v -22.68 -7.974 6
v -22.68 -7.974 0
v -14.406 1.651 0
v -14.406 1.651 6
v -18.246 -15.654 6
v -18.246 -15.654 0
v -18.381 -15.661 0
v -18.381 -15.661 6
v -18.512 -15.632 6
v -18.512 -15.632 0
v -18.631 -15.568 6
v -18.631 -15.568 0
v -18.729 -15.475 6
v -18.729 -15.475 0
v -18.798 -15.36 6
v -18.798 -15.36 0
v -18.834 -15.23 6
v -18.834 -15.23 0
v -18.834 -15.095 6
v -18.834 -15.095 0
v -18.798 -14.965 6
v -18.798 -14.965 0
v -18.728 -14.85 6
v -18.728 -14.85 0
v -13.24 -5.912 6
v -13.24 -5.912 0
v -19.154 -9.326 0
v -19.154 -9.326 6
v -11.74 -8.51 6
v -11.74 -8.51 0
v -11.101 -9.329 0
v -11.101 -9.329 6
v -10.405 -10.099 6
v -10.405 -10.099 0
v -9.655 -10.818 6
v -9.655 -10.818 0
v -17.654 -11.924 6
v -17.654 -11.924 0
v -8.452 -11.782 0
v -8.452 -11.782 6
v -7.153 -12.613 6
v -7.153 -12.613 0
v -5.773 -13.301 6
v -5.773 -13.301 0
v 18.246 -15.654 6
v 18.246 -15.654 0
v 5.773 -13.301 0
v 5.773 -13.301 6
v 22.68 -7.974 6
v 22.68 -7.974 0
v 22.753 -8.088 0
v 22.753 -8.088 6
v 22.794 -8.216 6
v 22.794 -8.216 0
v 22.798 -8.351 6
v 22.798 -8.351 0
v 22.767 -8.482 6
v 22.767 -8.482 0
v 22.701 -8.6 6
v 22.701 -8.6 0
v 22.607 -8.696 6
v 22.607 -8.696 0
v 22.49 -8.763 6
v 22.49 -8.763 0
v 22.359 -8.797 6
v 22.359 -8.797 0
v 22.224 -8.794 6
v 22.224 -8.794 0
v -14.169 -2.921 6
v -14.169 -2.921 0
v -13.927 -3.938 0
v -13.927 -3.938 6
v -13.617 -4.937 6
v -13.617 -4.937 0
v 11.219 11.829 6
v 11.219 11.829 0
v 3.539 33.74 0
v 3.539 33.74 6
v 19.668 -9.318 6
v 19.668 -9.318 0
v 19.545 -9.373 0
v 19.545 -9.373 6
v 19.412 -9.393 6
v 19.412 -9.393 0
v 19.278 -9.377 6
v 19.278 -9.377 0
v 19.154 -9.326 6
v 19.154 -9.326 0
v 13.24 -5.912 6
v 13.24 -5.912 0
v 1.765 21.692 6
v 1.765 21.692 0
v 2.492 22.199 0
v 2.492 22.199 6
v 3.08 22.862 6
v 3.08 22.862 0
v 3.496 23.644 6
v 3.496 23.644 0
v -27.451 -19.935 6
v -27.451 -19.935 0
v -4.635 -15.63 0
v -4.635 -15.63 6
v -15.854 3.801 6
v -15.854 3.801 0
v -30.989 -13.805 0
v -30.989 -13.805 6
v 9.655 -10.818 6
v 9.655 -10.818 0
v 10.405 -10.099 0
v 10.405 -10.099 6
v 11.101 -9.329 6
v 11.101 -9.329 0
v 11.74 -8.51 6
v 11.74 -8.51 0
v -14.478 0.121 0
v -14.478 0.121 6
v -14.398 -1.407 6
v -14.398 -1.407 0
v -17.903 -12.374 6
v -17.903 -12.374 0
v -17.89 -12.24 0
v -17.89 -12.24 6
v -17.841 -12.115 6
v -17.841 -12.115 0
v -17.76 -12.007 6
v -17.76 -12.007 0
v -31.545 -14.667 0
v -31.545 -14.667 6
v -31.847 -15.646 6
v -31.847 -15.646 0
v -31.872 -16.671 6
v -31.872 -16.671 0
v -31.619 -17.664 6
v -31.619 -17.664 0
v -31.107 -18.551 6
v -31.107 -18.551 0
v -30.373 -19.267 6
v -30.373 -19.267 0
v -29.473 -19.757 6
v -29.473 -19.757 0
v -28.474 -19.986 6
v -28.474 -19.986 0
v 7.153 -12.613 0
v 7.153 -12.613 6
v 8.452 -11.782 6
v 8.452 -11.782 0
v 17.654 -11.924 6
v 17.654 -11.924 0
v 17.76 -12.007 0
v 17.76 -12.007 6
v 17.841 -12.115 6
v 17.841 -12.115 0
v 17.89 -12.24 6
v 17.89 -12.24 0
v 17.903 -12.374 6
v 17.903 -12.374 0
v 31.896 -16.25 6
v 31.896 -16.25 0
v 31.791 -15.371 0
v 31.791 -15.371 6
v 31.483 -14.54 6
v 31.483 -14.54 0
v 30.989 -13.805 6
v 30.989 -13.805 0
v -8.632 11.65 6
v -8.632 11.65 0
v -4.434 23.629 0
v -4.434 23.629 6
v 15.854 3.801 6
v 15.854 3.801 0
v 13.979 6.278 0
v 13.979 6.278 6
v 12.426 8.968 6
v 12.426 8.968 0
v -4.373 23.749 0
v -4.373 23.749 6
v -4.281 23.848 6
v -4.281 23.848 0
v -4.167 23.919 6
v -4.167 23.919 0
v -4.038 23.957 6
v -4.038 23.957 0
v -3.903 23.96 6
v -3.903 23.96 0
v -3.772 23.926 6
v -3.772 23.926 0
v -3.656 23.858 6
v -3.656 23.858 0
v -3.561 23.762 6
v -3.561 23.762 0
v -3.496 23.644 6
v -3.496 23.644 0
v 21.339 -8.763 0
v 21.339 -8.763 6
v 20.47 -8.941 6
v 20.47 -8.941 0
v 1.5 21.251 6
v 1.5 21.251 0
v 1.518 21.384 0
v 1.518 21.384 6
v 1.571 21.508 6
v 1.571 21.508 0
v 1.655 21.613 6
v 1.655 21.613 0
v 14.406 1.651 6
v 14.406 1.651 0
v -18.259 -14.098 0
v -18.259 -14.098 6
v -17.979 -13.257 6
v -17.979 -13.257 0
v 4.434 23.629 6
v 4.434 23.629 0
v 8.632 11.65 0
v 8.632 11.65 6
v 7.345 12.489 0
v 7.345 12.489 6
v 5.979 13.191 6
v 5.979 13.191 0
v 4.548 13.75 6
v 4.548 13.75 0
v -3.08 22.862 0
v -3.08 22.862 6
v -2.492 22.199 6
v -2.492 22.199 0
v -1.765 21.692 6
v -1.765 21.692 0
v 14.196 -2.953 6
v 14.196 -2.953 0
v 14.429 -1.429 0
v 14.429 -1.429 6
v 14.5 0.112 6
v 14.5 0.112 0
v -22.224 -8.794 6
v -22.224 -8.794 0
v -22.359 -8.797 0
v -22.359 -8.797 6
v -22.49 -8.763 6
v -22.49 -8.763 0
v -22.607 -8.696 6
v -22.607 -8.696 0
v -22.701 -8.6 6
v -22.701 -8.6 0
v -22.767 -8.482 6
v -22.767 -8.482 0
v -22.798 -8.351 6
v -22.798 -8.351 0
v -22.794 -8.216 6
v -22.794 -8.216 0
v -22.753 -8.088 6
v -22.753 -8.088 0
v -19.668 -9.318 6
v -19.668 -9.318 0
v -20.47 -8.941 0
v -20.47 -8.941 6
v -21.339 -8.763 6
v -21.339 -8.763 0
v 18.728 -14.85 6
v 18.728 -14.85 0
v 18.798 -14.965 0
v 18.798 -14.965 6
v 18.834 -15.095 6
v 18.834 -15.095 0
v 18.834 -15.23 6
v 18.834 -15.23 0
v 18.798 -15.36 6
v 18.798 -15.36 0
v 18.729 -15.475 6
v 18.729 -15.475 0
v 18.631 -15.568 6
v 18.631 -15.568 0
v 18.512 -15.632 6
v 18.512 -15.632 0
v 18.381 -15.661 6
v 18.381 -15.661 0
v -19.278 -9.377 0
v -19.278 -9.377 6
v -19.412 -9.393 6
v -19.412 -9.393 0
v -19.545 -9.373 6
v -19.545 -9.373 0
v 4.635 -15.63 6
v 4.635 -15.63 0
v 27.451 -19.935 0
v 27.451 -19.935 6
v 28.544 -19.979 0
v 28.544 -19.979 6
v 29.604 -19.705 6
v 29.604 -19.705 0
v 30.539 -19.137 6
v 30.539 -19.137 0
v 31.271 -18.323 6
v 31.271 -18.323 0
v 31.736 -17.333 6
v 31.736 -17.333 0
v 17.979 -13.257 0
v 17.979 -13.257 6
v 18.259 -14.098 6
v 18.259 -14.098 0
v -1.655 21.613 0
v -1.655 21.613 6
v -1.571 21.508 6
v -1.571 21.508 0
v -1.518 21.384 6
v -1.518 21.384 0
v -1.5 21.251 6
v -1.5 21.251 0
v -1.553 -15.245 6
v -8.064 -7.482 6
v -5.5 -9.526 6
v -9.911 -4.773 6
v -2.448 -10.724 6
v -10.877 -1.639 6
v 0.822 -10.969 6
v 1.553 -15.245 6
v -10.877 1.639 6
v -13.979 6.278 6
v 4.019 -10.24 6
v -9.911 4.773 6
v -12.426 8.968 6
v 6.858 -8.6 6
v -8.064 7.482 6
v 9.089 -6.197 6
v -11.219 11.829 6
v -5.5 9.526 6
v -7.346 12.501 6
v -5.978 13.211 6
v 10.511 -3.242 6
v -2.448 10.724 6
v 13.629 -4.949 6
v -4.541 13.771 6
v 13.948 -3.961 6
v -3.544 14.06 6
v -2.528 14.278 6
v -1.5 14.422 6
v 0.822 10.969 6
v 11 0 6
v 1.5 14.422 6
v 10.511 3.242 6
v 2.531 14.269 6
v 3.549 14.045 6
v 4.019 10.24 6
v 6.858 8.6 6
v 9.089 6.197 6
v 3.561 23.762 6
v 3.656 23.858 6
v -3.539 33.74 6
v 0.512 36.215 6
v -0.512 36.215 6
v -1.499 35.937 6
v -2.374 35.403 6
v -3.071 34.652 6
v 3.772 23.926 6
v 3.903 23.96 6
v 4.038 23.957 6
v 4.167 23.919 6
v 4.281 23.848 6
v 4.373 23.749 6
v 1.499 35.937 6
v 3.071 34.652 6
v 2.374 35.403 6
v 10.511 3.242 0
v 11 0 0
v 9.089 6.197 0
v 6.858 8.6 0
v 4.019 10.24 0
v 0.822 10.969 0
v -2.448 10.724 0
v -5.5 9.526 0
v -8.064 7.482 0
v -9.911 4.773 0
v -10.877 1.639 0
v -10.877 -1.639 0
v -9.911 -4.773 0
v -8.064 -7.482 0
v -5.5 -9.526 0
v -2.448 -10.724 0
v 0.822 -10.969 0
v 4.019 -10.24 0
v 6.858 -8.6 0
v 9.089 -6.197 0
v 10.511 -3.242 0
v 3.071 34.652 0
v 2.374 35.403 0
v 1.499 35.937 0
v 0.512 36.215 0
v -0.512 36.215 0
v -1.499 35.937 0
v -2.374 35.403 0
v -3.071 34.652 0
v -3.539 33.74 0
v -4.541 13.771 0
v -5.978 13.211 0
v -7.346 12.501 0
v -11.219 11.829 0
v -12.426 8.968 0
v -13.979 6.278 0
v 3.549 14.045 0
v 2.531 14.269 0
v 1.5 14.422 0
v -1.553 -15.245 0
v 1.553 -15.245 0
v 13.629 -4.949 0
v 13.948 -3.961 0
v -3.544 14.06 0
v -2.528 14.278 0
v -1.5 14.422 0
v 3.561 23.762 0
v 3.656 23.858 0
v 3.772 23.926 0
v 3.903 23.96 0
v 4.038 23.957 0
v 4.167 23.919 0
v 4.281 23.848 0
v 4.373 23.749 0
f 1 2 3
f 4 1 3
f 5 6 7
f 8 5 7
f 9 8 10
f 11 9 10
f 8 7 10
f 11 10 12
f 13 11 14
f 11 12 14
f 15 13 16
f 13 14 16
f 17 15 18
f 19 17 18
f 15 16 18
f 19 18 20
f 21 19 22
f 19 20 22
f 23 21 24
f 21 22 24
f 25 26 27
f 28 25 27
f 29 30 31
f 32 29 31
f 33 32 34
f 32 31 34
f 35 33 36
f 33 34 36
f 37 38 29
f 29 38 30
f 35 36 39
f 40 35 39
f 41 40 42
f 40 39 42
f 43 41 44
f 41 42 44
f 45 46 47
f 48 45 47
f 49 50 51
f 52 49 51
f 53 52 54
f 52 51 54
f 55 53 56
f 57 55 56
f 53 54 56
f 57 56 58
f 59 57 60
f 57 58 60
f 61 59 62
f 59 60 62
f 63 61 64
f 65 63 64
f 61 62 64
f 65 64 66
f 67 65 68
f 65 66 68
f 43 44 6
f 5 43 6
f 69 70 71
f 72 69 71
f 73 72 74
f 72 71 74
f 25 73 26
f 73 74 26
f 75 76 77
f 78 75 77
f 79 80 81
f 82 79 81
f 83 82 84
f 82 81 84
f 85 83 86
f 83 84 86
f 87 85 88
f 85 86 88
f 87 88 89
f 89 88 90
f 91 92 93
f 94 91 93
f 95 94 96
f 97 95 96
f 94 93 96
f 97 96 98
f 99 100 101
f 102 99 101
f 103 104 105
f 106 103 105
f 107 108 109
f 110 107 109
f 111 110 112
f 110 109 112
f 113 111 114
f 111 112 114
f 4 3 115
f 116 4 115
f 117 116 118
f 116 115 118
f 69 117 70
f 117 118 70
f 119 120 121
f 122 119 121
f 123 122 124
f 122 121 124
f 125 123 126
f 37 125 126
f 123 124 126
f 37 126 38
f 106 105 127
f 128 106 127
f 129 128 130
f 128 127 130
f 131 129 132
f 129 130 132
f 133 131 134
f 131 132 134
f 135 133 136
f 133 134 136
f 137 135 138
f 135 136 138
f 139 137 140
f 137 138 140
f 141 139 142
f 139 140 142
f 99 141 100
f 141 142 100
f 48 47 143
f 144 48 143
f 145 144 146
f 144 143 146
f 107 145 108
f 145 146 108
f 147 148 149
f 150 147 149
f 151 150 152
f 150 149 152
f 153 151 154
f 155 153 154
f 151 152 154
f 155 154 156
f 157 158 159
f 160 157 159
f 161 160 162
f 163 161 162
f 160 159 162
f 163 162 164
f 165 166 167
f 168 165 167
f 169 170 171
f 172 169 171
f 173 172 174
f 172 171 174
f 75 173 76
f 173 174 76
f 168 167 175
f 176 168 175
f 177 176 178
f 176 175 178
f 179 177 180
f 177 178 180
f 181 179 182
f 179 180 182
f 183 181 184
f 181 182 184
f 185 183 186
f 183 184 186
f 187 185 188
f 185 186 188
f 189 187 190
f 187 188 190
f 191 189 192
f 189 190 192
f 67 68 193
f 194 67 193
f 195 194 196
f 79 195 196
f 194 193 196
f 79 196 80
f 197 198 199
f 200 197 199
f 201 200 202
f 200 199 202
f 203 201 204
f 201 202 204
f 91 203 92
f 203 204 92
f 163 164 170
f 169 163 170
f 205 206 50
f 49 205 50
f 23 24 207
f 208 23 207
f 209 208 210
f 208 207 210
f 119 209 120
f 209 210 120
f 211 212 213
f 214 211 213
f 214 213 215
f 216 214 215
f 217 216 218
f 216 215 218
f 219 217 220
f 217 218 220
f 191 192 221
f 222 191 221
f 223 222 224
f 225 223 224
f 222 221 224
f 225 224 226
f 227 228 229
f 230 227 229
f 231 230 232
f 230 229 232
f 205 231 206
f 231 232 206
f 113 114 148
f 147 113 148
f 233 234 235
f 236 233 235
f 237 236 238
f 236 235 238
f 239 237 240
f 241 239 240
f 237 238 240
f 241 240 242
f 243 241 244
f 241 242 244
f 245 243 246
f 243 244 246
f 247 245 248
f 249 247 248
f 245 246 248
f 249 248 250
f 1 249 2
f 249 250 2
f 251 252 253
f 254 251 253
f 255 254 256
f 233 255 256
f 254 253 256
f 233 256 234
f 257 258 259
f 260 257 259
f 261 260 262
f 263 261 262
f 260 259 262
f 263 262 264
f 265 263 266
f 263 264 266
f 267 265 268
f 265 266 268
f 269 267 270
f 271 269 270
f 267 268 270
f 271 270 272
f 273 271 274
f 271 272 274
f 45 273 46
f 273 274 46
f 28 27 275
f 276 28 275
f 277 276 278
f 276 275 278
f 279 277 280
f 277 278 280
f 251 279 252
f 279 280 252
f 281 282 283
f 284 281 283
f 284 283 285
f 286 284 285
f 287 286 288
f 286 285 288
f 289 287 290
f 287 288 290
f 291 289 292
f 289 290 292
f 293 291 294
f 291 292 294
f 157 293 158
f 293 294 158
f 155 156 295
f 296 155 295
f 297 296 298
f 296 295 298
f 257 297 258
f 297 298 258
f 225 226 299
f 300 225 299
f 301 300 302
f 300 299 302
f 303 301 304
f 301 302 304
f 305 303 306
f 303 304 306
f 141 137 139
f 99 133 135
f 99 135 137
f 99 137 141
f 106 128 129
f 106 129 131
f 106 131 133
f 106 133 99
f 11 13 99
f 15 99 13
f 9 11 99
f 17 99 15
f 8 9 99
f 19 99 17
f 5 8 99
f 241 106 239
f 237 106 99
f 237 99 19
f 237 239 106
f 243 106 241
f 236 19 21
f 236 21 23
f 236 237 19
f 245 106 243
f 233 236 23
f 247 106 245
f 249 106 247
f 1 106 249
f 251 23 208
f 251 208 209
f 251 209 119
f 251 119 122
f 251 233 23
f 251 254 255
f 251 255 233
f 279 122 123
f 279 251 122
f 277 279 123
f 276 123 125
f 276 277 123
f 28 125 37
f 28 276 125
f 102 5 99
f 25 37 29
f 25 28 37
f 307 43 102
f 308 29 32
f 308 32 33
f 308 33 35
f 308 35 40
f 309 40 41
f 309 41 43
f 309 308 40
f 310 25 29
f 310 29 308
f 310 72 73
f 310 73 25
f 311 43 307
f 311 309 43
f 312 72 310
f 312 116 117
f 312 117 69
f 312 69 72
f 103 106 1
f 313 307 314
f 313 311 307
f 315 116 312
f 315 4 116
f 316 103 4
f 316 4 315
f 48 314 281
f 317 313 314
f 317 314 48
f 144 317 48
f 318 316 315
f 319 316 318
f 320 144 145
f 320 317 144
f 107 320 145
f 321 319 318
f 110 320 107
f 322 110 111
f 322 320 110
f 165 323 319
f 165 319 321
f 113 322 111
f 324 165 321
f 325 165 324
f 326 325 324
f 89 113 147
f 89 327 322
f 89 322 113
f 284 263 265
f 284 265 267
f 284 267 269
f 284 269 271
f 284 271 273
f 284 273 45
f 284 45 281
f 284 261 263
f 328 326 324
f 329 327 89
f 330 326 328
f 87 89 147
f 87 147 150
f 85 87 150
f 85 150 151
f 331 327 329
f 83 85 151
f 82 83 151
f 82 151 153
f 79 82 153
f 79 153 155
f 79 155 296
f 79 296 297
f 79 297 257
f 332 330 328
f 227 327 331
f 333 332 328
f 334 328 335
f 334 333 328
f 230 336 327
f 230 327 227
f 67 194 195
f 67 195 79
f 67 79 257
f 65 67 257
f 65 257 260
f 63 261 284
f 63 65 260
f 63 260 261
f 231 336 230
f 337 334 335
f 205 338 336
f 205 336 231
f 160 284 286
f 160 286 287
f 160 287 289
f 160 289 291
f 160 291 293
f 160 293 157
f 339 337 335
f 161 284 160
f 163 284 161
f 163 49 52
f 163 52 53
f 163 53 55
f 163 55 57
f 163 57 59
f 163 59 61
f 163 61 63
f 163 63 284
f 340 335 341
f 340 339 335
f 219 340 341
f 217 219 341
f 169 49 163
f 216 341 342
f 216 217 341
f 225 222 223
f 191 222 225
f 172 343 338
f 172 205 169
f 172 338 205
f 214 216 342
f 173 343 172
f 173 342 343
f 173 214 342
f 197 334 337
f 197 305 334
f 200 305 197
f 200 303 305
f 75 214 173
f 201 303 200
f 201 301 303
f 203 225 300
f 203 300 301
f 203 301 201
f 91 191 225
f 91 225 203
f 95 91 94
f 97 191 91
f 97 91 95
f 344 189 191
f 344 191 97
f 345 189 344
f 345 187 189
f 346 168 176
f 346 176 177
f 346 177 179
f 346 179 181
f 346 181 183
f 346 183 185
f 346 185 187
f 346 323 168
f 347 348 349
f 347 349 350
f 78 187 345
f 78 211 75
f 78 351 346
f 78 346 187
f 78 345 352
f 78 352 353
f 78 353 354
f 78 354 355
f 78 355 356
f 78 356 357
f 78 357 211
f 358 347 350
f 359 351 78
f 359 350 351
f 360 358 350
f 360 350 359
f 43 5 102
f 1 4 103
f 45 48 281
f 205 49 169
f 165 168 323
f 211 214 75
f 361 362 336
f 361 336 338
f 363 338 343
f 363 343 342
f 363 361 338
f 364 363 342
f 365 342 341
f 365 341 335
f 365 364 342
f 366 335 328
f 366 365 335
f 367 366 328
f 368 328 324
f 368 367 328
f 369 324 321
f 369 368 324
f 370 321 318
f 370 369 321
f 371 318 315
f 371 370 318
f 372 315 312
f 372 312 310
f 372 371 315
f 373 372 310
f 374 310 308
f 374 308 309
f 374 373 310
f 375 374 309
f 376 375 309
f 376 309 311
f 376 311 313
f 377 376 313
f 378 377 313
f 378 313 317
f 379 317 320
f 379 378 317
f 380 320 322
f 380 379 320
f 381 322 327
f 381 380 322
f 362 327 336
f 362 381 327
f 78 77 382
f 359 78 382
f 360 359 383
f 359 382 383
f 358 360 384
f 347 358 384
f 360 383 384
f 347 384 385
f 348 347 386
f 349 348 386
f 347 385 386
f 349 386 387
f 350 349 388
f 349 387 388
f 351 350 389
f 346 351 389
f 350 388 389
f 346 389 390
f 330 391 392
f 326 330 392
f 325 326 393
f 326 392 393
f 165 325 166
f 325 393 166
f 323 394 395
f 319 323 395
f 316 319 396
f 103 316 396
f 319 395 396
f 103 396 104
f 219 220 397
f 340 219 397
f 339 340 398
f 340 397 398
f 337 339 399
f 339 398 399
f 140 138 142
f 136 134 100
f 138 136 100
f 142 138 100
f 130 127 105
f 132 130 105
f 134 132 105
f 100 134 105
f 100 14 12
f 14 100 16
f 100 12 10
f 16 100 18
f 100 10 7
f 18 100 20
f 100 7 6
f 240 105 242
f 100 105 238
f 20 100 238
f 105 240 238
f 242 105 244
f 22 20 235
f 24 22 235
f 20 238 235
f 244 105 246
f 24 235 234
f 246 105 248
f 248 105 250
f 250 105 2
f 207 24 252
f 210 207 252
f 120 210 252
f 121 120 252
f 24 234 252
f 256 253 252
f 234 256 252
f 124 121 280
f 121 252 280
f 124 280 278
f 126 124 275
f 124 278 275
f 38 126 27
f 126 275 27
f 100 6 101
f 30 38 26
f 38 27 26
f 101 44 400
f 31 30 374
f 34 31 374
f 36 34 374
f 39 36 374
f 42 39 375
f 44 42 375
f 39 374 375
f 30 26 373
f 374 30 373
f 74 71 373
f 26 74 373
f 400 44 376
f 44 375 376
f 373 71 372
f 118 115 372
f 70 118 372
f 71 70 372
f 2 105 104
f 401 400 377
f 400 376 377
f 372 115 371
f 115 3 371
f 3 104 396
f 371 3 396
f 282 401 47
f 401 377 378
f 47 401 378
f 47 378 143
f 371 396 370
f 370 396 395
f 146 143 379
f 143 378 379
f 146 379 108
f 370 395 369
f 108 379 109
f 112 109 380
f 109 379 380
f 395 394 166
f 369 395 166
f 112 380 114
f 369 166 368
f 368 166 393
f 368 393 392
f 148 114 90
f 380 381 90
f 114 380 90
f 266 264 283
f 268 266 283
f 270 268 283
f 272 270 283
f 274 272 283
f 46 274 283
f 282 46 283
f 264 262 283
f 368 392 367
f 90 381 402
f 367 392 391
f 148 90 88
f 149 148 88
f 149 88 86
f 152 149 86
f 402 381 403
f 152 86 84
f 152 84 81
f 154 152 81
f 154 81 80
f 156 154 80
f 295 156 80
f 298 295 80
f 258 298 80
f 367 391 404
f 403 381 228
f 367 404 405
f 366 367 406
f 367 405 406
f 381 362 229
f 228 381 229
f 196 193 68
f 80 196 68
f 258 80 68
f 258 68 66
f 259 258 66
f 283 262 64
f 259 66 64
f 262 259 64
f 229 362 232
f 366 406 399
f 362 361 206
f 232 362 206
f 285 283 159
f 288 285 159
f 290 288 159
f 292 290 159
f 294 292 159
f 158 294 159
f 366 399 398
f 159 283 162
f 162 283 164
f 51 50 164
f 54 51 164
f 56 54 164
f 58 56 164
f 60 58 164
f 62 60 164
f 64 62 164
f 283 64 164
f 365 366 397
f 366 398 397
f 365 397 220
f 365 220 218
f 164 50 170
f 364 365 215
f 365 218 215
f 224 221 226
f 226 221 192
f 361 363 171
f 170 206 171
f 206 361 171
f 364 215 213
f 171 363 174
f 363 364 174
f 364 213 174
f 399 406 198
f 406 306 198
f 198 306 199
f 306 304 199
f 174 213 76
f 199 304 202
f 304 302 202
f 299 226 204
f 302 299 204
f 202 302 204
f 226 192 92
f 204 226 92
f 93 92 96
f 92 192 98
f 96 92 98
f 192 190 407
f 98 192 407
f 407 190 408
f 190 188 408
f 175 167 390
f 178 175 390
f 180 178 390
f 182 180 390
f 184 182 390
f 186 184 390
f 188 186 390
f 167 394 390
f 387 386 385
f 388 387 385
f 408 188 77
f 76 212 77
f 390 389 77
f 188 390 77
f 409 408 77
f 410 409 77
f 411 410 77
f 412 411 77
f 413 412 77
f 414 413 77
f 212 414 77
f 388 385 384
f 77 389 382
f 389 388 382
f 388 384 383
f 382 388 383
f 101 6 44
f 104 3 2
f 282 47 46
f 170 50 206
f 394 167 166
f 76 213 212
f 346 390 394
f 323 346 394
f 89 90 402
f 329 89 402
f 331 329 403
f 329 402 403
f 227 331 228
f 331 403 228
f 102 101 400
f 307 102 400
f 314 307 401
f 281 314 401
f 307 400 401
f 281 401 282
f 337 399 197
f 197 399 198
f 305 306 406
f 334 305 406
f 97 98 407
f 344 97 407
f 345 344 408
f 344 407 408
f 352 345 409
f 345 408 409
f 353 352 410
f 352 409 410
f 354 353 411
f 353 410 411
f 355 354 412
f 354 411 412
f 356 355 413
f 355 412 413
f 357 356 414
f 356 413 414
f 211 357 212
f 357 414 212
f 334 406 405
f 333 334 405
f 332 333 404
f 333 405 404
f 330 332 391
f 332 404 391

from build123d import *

# Parameters (mm, degrees)
F0_R     = 11
F1_DEPTH = 6


# Not quite as in the source:
# - a feature names something its author has since deleted; it is built from what else it names


with BuildPart() as f1:
    # F0 (on Top) → F1 (new body)
    with BuildSketch(Plane.XY):
        with BuildLine():
            Line((-17.653754974, -11.924450994), (-11.7399959968, -8.5101406566))
            ThreePointArc((-11.7399959968, -8.5101406566), (-10.7595852813, -9.7201504399), (-9.655057883, -10.8180338914))
            ThreePointArc((-9.655057883, -10.8180338914), (-7.8135298696, -12.2146940599), (-5.7734811503, -13.3010118189))
            Line((-5.7734811503, -13.3010118189), (-18.2459966778, -15.6542301338))
            ThreePointArc((-18.2459966778, -15.6542301338), (-18.7675177207, -15.4200232887), (-18.72842119, -14.8496650628))
            ThreePointArc((-18.72842119, -14.8496650628), (-21.1687491133, -16.2192293875), (-23.8778204631, -15.5179168796))
            ThreePointArc((-23.8778204631, -15.5179168796), (-24.4287426612, -15.0200539994), (-24.8707648644, -14.4233974084))
            ThreePointArc((-24.8707648644, -14.4233974084), (-24.516502143, -15.306331055), (-24.395825623, -16.25))
            ThreePointArc((-24.395825623, -16.25), (-25.2588111204, -18.643250355), (-27.4505708292, -19.9349858577))
            Line((-27.4505708292, -19.9349858577), (-4.6350319583, -15.6303254372))
            ThreePointArc((-4.6350319583, -15.6303254372), (0, -15.1968978222), (4.6350319583, -15.6303254372))
            Line((4.6350319583, -15.6303254372), (27.4505708292, -19.9349858577))
            ThreePointArc((27.4505708292, -19.9349858577), (24.7494668073, -17.8397316739), (24.8707648644, -14.4233974084))
            ThreePointArc((24.8707648644, -14.4233974084), (27.7689882832, -12.5189822274), (30.9894895915, -13.8053987576))
            Line((30.9894895915, -13.8053987576), (15.8537748772, 3.8011072954))
            ThreePointArc((15.8537748772, 3.8011072954), (13.1608995727, 7.5984489111), (11.2187429189, 11.8292181419))
            Line((11.2187429189, 11.8292181419), (3.5389187623, 33.7403846154))
            ThreePointArc((3.5389187623, 33.7403846154), (0, 36.25), (-3.5389187623, 33.7403846154))
            Line((-3.5389187623, 33.7403846154), (-11.2187429189, 11.8292181419))
            ThreePointArc((-11.2187429189, 11.8292181419), (-13.1608995727, 7.5984489111), (-15.8537748772, 3.8011072954))
            Line((-15.8537748772, 3.8011072954), (-30.9894895915, -13.8053987576))
            ThreePointArc((-30.9894895915, -13.8053987576), (-27.8243942299, -12.5138011483), (-24.9264109967, -14.32701548))
            ThreePointArc((-24.9264109967, -14.32701548), (-25.2221196603, -13.6458847274), (-25.3778204631, -12.9198406683))
            ThreePointArc((-25.3778204631, -12.9198406683), (-24.630639236, -10.2230598047), (-22.2243977771, -8.7944559919))
            ThreePointArc((-22.2243977771, -8.7944559919), (-22.7378907553, -8.5431354678), (-22.6799593114, -7.9743815734))
            Line((-22.6799593114, -7.9743815734), (-14.4057547064, 1.650524565))
            ThreePointArc((-14.4057547064, 1.650524565), (-14.4569527647, -0.6438963434), (-14.1689115613, -2.9207408288))
            ThreePointArc((-14.1689115613, -2.9207408288), (-13.7801833851, -4.4399194539), (-13.2399959968, -5.9120644453))
            Line((-13.2399959968, -5.9120644453), (-19.153754974, -9.3263747827))
            ThreePointArc((-19.153754974, -9.3263747827), (-19.4121649397, -9.3932913482), (-19.6681779463, -9.3177209993))
            ThreePointArc((-19.6681779463, -9.3177209993), (-18.403754974, -10.6254128883), (-17.9034720639, -12.374281248))
            ThreePointArc((-17.9034720639, -12.374281248), (-17.8409114026, -12.1147823061), (-17.653754974, -11.924450994))
        make_face()
        with BuildLine():
            ThreePointArc((17.9034720639, -12.374281248), (18.093710781, -13.6860357173), (18.72842119, -14.8496650628))
            ThreePointArc((18.72842119, -14.8496650628), (18.7675177207, -15.4200232887), (18.2459966778, -15.6542301338))
            Line((18.2459966778, -15.6542301338), (5.7734811503, -13.3010118189))
            ThreePointArc((5.7734811503, -13.3010118189), (7.8135298696, -12.2146940599), (9.655057883, -10.8180338914))
            ThreePointArc((9.655057883, -10.8180338914), (10.7595852813, -9.7201504399), (11.7399959968, -8.5101406566))
            Line((11.7399959968, -8.5101406566), (17.653754974, -11.924450994))
            ThreePointArc((17.653754974, -11.924450994), (17.8409114026, -12.1147823061), (17.9034720639, -12.374281248))
        make_face(mode=Mode.SUBTRACT)
        Circle(F0_R, mode=Mode.SUBTRACT)
        with BuildLine():
            ThreePointArc((22.2243977771, -8.7944559919), (20.8993099987, -8.8265953264), (19.6681779463, -9.3177209993))
            ThreePointArc((19.6681779463, -9.3177209993), (19.4121649397, -9.3932913482), (19.153754974, -9.3263747827))
            Line((19.153754974, -9.3263747827), (13.2399959968, -5.9120644453))
            ThreePointArc((13.2399959968, -5.9120644453), (13.7976898502, -4.4579989679), (14.1962211105, -2.952508456))
            ThreePointArc((14.1962211105, -2.952508456), (14.4850002901, -0.6593683303), (14.4057547064, 1.650524565))
            Line((14.4057547064, 1.650524565), (22.6799593114, -7.9743815734))
            ThreePointArc((22.6799593114, -7.9743815734), (22.7378907553, -8.5431354678), (22.2243977771, -8.7944559919))
        make_face(mode=Mode.SUBTRACT)
        with BuildLine():
            ThreePointArc((-3.4959765871, 23.6441210547), (-2.8055992178, 22.5126310437), (-1.7647058824, 21.6920022473))
            ThreePointArc((-1.7647058824, 21.6920022473), (-1.5712535371, 21.5080736544), (-1.5, 21.2508257767))
            Line((-1.5, 21.2508257767), (-1.5, 14.4222051019))
            ThreePointArc((-1.5, 14.4222051019), (-3.0381045689, 14.1781494077), (-4.5411632274, 13.7705423474))
            ThreePointArc((-4.5411632274, 13.7705423474), (-6.6714704205, 12.8740623902), (-8.632273556, 11.6504872539))
            Line((-8.632273556, 11.6504872539), (-4.4339626337, 23.6286117072))
            ThreePointArc((-4.4339626337, 23.6286117072), (-3.9703730346, 23.9631587565), (-3.4959765871, 23.6441210547))
        make_face(mode=Mode.SUBTRACT)
        with BuildLine():
            ThreePointArc((3.4959765871, 23.6441210547), (3.9703730346, 23.9631587565), (4.4339626337, 23.6286117072))
            Line((4.4339626337, 23.6286117072), (8.632273556, 11.6504872539))
            ThreePointArc((8.632273556, 11.6504872539), (6.6711103348, 12.8576010839), (4.5482718222, 13.7502609452))
            ThreePointArc((4.5482718222, 13.7502609452), (3.041663637, 14.1657474781), (1.5, 14.4222051019))
            Line((1.5, 14.4222051019), (1.5, 21.2508257767))
            ThreePointArc((1.5, 21.2508257767), (1.5712535371, 21.5080736544), (1.7647058824, 21.6920022473))
            ThreePointArc((1.7647058824, 21.6920022473), (2.8055992178, 22.5126310437), (3.4959765871, 23.6441210547))
        make_face(mode=Mode.SUBTRACT)
        with BuildLine():
            ThreePointArc((-18.72842119, -14.8496650628), (-18.093710781, -13.6860357173), (-17.9034720639, -12.374281248))
            ThreePointArc((-17.9034720639, -12.374281248), (-18.403754974, -10.6254128883), (-19.6681779463, -9.3177209993))
            ThreePointArc((-19.6681779463, -9.3177209993), (-20.8993099987, -8.8265953264), (-22.2243977771, -8.7944559919))
            ThreePointArc((-22.2243977771, -8.7944559919), (-24.630639236, -10.2230598047), (-25.3778204631, -12.9198406683))
            ThreePointArc((-25.3778204631, -12.9198406683), (-25.2221196603, -13.6458847274), (-24.9264109967, -14.32701548))
            ThreePointArc((-24.9264109967, -14.32701548), (-24.8982303588, -14.375), (-24.8707648644, -14.4233974084))
            ThreePointArc((-24.8707648644, -14.4233974084), (-24.4287426612, -15.0200539994), (-23.8778204631, -15.5179168796))
            ThreePointArc((-23.8778204631, -15.5179168796), (-21.1687491133, -16.2192293875), (-18.72842119, -14.8496650628))
        make_face()
        with BuildLine():
            ThreePointArc((-24.395825623, -16.25), (-24.516502143, -15.306331055), (-24.8707648644, -14.4233974084))
            ThreePointArc((-24.8707648644, -14.4233974084), (-24.8982303588, -14.375), (-24.9264109967, -14.32701548))
            ThreePointArc((-24.9264109967, -14.32701548), (-27.8243942299, -12.5138011483), (-30.9894895915, -13.8053987576))
            ThreePointArc((-30.9894895915, -13.8053987576), (-31.3934208872, -18.125), (-27.4505708292, -19.9349858577))
            ThreePointArc((-27.4505708292, -19.9349858577), (-25.2588111204, -18.643250355), (-24.395825623, -16.25))
        make_face()
        with BuildLine():
            ThreePointArc((24.8707648644, -14.4233974084), (24.7494668073, -17.8397316739), (27.4505708292, -19.9349858577))
            ThreePointArc((27.4505708292, -19.9349858577), (30.539075978, -19.1370145026), (31.895825623, -16.25))
            ThreePointArc((31.895825623, -16.25), (31.6619484793, -14.9463972771), (30.9894895915, -13.8053987576))
            ThreePointArc((30.9894895915, -13.8053987576), (27.7689882832, -12.5189822274), (24.8707648644, -14.4233974084))
        make_face()
    extrude(amount=F1_DEPTH)


solid = f1.part
